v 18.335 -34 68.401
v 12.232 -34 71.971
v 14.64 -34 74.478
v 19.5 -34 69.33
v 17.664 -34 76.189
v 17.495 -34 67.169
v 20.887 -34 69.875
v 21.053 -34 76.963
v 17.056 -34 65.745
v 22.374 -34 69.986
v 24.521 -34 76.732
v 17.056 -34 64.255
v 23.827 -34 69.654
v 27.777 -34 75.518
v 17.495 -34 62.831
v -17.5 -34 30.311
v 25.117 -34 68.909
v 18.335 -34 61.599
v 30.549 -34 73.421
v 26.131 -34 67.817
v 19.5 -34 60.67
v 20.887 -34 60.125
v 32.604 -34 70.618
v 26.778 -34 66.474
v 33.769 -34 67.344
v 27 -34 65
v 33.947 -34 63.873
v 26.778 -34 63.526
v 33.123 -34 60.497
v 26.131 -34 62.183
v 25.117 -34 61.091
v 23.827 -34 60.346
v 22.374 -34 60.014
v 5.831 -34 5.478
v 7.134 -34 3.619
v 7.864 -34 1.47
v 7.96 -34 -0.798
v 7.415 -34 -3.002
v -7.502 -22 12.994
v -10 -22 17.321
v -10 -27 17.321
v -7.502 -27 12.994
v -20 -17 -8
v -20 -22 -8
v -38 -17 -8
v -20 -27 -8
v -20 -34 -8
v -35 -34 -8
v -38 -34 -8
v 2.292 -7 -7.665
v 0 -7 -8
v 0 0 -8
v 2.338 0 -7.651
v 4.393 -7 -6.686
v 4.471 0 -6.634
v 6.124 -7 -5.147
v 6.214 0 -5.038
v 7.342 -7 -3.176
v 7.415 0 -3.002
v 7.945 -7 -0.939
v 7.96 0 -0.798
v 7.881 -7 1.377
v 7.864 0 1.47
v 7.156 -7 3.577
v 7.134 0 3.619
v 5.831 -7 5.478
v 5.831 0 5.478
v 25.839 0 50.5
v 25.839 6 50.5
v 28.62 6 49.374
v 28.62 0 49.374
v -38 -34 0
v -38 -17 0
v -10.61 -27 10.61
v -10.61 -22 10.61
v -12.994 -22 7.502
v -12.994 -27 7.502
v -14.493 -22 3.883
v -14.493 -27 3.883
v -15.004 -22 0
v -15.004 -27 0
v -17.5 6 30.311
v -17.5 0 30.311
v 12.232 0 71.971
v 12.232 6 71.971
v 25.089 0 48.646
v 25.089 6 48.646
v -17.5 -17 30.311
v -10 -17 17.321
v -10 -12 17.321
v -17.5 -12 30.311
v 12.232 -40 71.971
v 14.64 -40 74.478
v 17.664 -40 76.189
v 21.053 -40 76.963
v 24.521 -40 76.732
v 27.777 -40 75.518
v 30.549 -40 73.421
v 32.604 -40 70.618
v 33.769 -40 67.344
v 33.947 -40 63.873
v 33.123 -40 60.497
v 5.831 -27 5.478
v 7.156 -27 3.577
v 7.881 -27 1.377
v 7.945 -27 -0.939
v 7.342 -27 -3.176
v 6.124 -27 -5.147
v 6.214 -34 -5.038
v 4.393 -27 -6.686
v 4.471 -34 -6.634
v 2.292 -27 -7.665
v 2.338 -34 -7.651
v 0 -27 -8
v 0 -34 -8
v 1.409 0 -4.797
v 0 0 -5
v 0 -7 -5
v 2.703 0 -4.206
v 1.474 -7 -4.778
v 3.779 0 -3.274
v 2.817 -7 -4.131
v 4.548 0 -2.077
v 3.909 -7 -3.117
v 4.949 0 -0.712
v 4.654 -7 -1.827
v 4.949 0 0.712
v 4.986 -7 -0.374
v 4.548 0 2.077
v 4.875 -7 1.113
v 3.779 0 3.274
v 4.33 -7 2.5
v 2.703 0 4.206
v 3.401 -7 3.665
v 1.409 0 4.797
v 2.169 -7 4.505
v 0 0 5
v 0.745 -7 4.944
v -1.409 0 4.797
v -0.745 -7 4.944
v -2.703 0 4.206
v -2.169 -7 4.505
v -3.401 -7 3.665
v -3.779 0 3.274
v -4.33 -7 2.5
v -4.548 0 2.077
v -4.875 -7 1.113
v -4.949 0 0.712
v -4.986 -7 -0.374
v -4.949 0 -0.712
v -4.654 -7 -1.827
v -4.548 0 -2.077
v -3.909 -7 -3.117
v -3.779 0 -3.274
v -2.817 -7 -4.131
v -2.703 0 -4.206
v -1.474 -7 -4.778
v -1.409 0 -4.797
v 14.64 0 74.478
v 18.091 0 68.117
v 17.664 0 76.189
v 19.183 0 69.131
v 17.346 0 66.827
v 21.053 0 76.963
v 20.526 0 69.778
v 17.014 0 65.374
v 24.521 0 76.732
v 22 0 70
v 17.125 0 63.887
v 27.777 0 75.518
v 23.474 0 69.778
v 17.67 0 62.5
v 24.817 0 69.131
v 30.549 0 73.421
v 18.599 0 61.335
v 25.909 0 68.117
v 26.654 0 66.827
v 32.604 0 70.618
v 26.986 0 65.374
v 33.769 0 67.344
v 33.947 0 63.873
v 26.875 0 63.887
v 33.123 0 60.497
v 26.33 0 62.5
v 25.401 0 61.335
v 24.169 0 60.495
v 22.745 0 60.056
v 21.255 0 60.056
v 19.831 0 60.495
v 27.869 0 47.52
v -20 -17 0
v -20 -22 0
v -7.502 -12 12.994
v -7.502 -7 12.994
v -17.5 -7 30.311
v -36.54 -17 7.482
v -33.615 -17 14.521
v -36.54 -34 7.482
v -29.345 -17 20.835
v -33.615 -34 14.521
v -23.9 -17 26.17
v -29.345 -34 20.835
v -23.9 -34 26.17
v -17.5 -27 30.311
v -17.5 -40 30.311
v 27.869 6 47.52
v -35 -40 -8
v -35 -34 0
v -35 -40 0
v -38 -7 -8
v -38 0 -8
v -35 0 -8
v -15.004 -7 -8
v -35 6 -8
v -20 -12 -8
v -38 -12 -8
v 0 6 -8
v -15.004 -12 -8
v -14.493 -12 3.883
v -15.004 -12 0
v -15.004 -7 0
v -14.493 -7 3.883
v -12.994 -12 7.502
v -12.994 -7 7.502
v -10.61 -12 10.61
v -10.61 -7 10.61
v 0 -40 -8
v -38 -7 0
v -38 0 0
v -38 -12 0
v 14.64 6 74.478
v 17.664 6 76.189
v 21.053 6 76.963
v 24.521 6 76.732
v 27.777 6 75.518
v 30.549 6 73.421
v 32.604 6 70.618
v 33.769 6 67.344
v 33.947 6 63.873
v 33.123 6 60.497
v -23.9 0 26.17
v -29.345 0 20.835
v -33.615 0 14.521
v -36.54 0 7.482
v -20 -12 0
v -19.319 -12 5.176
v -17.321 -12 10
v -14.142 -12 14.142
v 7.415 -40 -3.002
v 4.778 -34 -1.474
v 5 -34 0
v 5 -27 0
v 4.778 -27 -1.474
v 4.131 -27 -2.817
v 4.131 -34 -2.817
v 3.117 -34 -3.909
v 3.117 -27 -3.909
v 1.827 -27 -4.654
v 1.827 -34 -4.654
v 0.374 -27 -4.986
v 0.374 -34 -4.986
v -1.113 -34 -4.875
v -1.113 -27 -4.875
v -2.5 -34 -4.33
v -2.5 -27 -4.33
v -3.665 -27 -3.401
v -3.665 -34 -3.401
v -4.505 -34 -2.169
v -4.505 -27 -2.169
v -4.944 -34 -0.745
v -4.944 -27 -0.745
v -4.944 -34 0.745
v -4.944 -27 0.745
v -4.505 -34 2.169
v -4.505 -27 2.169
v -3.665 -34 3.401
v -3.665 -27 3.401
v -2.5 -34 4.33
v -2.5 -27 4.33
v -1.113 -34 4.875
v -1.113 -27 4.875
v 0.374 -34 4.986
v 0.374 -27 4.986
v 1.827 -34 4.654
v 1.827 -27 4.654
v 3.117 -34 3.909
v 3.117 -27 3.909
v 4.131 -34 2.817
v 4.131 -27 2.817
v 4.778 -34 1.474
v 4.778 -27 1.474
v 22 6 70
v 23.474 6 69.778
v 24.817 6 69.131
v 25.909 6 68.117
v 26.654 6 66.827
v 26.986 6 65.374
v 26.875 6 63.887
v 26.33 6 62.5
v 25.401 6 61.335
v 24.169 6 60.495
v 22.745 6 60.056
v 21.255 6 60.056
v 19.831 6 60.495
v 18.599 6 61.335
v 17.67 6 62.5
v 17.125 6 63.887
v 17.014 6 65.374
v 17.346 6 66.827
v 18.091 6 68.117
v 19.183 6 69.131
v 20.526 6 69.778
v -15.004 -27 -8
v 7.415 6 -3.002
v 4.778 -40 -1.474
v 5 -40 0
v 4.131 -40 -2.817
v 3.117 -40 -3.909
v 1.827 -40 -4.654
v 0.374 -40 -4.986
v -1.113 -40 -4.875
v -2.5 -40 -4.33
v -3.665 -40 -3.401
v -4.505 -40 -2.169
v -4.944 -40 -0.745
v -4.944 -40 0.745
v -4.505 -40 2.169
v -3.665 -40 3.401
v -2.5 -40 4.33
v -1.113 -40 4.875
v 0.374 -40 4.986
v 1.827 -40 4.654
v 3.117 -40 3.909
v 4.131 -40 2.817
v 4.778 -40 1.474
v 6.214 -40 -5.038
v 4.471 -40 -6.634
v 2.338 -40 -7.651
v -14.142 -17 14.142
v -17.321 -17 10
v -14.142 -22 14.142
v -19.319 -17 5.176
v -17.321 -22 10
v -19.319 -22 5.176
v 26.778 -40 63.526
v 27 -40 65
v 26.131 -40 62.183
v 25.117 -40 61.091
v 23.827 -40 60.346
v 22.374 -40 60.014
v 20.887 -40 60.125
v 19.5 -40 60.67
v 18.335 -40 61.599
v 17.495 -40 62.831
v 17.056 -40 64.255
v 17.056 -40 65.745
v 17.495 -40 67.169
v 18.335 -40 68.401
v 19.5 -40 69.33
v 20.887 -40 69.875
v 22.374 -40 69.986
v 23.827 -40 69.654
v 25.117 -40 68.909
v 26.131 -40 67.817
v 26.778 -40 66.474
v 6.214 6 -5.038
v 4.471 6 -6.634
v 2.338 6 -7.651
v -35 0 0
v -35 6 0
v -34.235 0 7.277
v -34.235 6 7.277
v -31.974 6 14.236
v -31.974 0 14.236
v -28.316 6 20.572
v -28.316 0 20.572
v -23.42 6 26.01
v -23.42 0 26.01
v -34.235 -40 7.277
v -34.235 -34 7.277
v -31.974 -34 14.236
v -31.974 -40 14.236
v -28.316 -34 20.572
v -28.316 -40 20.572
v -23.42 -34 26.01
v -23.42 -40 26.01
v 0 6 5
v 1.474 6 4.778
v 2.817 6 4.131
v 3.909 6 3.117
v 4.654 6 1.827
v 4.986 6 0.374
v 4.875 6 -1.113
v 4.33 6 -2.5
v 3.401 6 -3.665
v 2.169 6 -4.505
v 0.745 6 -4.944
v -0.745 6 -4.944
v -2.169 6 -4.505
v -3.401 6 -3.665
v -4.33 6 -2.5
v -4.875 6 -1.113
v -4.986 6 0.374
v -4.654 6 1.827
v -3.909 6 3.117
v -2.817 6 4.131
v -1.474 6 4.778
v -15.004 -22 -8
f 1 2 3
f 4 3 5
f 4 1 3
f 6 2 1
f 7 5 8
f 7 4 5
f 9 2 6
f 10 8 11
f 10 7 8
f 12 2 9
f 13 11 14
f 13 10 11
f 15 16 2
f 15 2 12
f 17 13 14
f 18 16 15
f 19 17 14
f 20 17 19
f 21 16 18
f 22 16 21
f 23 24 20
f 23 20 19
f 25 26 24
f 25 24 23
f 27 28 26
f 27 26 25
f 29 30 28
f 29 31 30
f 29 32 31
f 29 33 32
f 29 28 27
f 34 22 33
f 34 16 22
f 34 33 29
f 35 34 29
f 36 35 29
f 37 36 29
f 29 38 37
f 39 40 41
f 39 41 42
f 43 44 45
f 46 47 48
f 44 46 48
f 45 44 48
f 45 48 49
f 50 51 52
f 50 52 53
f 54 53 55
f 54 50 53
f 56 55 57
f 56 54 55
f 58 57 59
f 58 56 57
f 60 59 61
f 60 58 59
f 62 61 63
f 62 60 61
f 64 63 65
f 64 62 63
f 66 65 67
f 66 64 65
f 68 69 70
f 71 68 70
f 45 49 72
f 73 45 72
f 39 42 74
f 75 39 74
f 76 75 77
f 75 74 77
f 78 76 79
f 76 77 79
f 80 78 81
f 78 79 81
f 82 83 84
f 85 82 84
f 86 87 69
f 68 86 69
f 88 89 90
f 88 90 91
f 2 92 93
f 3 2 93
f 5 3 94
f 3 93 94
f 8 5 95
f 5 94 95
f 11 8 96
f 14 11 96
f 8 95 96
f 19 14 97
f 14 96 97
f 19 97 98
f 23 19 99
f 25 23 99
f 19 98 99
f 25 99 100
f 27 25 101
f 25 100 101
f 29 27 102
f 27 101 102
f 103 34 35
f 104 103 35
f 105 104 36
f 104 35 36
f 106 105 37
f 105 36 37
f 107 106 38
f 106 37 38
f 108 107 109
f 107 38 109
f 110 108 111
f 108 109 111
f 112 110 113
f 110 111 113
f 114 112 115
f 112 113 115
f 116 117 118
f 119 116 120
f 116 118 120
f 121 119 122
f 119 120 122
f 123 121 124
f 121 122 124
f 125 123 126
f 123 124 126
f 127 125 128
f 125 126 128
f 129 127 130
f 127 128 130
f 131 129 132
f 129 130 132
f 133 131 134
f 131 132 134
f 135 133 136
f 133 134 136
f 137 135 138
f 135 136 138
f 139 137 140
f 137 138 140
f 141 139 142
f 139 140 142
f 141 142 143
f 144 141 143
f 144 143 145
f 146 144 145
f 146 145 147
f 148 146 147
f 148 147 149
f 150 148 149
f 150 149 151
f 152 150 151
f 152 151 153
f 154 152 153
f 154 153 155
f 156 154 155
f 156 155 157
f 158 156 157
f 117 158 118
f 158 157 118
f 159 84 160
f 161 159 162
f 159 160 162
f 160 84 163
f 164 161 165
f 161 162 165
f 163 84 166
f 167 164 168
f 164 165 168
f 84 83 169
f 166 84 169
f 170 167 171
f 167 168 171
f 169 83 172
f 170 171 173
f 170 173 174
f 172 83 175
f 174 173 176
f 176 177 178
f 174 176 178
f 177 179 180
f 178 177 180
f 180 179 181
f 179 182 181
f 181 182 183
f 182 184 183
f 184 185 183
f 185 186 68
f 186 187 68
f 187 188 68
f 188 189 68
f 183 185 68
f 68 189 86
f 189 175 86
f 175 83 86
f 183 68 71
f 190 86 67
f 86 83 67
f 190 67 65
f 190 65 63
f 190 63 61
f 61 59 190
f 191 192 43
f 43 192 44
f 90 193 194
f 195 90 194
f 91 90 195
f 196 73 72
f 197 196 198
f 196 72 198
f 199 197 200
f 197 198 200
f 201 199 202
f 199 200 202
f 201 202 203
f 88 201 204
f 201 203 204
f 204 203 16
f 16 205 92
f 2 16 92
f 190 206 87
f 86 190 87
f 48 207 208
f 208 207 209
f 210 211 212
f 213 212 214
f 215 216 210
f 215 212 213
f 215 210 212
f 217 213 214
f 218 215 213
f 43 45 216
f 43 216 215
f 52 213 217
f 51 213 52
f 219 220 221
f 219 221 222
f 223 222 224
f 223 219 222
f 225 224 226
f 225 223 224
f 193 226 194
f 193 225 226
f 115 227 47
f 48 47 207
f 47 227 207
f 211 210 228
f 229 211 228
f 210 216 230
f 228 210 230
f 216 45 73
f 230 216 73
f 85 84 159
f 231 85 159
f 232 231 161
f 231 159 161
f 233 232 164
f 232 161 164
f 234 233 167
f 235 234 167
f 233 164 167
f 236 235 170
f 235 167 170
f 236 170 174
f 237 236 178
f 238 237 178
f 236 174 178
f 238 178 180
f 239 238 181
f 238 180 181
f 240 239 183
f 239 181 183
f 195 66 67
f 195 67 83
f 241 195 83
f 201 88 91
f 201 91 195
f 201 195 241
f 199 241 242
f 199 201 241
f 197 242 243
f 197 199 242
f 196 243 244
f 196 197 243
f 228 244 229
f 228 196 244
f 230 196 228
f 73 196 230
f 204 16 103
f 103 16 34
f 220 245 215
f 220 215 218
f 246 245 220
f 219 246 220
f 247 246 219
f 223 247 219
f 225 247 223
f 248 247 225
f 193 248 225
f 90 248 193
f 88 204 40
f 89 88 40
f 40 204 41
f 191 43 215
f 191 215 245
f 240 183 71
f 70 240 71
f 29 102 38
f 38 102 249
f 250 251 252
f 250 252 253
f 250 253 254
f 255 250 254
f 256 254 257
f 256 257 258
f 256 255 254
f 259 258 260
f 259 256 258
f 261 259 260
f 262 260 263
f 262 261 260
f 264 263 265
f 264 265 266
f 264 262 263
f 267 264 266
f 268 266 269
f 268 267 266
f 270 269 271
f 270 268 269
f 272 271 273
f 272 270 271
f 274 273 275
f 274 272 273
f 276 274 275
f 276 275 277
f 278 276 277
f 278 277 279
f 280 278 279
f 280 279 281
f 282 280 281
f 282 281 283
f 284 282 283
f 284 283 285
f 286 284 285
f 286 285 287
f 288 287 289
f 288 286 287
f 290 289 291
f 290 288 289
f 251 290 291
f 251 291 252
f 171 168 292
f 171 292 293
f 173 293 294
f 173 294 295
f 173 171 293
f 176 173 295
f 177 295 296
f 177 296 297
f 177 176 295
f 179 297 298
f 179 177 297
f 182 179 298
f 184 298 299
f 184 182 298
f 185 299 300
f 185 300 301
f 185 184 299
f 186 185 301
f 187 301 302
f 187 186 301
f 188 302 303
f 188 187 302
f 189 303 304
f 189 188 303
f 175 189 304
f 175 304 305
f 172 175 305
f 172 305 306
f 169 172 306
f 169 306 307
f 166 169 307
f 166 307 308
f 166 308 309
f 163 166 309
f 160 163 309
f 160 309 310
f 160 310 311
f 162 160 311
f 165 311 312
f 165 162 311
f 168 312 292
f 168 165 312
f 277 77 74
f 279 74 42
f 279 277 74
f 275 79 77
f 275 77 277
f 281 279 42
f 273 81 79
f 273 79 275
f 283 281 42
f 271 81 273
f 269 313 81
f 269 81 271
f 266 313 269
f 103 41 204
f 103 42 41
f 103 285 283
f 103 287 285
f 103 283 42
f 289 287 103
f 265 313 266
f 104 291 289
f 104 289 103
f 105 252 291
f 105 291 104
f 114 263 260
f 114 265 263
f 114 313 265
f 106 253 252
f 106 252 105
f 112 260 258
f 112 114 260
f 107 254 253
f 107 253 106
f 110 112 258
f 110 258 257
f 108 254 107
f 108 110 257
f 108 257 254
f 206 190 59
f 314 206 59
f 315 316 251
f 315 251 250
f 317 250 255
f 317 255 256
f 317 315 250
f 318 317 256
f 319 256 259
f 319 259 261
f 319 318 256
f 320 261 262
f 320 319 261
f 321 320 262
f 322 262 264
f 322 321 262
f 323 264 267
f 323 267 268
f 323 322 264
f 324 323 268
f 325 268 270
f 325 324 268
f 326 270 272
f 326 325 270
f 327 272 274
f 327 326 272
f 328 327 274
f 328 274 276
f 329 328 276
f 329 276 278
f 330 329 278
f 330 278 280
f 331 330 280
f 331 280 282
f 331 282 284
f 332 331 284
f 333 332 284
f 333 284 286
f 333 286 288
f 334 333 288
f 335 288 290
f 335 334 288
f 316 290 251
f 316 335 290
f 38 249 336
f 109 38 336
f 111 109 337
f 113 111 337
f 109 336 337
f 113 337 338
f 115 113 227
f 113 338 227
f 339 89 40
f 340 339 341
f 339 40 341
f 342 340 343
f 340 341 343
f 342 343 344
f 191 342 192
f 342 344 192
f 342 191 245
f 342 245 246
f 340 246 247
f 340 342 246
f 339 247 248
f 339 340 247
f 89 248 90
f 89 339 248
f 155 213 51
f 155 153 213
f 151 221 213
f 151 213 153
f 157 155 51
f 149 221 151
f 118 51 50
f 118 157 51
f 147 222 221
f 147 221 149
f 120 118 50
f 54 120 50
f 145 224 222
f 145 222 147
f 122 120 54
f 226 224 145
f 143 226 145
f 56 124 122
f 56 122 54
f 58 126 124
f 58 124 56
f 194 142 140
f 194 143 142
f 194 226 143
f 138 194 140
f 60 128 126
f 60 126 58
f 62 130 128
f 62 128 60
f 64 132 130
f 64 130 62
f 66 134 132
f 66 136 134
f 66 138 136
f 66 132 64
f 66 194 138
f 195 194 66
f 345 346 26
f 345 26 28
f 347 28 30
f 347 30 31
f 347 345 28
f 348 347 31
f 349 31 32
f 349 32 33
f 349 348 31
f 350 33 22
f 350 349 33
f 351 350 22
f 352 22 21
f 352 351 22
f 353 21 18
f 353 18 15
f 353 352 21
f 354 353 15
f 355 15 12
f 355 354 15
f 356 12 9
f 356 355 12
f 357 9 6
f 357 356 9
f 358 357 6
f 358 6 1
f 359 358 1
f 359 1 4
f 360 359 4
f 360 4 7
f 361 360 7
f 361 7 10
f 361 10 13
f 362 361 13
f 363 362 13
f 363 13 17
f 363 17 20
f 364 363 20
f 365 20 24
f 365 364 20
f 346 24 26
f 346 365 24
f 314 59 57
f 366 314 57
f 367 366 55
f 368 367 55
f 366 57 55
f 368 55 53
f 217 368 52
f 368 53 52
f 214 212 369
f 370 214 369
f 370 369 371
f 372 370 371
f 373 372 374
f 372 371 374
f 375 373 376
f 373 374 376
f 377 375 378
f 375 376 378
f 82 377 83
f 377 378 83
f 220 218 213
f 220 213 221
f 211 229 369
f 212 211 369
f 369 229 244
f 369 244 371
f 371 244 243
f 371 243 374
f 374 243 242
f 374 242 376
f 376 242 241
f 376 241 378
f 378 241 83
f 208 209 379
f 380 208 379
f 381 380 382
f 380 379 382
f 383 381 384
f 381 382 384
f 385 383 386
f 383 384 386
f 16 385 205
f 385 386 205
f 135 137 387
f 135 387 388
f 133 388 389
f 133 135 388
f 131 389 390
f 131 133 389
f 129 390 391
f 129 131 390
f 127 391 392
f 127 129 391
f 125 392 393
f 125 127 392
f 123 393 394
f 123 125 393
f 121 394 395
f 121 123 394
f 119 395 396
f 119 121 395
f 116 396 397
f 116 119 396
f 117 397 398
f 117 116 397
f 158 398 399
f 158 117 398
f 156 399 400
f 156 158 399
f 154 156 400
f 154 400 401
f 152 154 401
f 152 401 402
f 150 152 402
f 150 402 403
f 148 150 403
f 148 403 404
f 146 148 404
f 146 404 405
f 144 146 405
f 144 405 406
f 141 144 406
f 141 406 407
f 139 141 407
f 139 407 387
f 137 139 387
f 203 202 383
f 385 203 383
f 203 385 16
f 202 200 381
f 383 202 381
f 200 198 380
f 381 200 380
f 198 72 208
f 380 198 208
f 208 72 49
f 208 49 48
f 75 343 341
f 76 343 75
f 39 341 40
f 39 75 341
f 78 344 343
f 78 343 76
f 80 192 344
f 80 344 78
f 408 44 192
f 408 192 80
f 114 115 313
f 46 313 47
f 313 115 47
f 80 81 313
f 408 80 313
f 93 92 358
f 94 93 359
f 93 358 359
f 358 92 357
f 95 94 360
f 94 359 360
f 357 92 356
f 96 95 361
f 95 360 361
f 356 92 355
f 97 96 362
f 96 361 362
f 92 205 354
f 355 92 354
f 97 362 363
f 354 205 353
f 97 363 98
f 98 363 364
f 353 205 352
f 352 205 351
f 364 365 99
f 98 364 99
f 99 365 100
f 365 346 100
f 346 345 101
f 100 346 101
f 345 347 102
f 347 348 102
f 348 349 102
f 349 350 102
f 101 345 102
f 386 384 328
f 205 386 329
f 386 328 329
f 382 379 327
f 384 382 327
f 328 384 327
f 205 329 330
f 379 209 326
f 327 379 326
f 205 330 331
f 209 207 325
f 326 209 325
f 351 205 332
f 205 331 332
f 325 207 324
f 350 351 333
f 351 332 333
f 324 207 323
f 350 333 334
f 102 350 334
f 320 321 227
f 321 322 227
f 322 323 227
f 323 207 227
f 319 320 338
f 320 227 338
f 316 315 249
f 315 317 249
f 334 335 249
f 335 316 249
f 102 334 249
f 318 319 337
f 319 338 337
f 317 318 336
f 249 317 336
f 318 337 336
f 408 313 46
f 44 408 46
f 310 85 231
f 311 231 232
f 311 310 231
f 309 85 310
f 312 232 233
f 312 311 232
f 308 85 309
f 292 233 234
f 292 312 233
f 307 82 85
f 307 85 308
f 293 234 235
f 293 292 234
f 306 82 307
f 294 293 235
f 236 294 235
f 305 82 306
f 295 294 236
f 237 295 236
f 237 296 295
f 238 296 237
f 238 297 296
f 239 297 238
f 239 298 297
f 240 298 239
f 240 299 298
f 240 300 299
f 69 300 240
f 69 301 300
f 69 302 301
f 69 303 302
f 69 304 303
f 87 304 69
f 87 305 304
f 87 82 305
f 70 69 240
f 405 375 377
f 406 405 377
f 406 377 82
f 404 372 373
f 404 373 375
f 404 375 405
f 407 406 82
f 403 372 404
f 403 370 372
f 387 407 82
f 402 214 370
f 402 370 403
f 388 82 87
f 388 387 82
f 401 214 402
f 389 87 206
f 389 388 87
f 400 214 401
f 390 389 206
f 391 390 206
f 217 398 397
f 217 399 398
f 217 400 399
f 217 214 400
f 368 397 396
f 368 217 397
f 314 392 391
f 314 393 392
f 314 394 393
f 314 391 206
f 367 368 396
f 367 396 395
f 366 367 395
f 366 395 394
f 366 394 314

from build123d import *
from build123d.topology import SkipClean

# Parameters (mm, degrees)
SKETCH2_R           = 5
BOSS_EXTRUDE1_DEPTH = 6
BOSS_EXTRUDE2_START = 7
SKETCH3_R           = 5
BOSS_EXTRUDE2_DEPTH = 7
BOSS_EXTRUDE3_START = 5
SKETCH4_W           = 22.995704609
SKETCH4_H           = 8
BOSS_EXTRUDE3_DEPTH = 5
BOSS_EXTRUDE4_START = 5
SKETCH5_W           = 18
SKETCH5_H           = 8
BOSS_EXTRUDE4_DEPTH = 5
MIRROR1_START       = -40
MIRROR1_OUTLINE_R   = 5
MIRROR1_DEPTH       = 6
MIRROR1_START_2     = -34
MIRROR1_2_DEPTH     = 17
MIRROR1_3_OUTLINE_R = 5
MIRROR1_3_DEPTH     = 7
MIRROR1_START_3     = -27
MIRROR1_4_DEPTH     = 5
CUT_EXTRUDE1_DEPTH  = 14


# Read off the part's stored shape, not the designer's step: Mirror1
with BuildPart() as part:
    # Sketch2 → Boss-Extrude1 (new body)
    with BuildSketch(Plane(origin=(0, 0, 0), x_dir=(1, 0, 0), z_dir=(0, 1, 0))):
        with BuildLine():
            ThreePointArc((7.415342239, 3.002115835), (4.471189625, 6.633887498), (0, 8))
            Line((0, 8), (-35, 8))
            Line((-35, 8), (-35, 0))
            ThreePointArc((-35, 0), (-30.310889132, -17.5), (-17.5, -30.310889132))
            Line((-17.5, -30.310889132), (12.232451358, -71.97101094))
            ThreePointArc((12.232451358, -71.97101094), (27.776984485, -75.517910927), (33.123013358, -60.496826248))
            Line((33.123013358, -60.496826248), (7.415342239, 3.002115835))
        make_face()
        with Locations(Location((0, 0, 0), (0, 0, 270))):
            Circle(SKETCH2_R, mode=Mode.SUBTRACT)
        with Locations(Location((22, -65, 0), (0, 0, 270))):
            Circle(SKETCH2_R, mode=Mode.SUBTRACT)
    extrude(amount=BOSS_EXTRUDE1_DEPTH)

    # Sketch3 → Boss-Extrude2 (add)
    with SkipClean():  # the faces are left unmerged after this step: merging them gives an invalid solid
        with BuildSketch(Plane.XZ.offset(BOSS_EXTRUDE2_START)):
            with BuildLine():
                Line((5.830508196, 5.47769789), (-17.5, 30.310889132))
                ThreePointArc((-17.5, 30.310889132), (-31.638718646, 17.785480653), (-38, 0))
                Line((-38, 0), (-38, -8))
                Line((-38, -8), (-35, -8))
                Line((-35, -8), (0, -8))
                ThreePointArc((0, -8), (7.342396854, -3.176351435), (5.830508196, 5.47769789))
            make_face()
            with Locations(Location((0, 0, 0), (0, 0, 270))):
                Circle(SKETCH3_R, mode=Mode.SUBTRACT)
        extrude(amount=-BOSS_EXTRUDE2_DEPTH)

    # Sketch4 → Boss-Extrude3 (add)
    with SkipClean():  # the faces are left unmerged after this step: merging them gives an invalid solid
        with BuildSketch(Plane.XZ.offset(7).offset(BOSS_EXTRUDE3_START)):
            with BuildLine():
                Line((-38, 0), (-15.004295391, 0))
                ThreePointArc((-15.004295391, 0), (-12.994100974, 7.502147695), (-7.502147695, 12.994100974))
                Line((-7.502147695, 12.994100974), (-17.5, 30.310889132))
                ThreePointArc((-17.5, 30.310889132), (-31.638718646, 17.785480653), (-38, 0))
            make_face()
            with Locations((-26.502147695, -4)):
                Rectangle(SKETCH4_W, SKETCH4_H)
        extrude(amount=-BOSS_EXTRUDE3_DEPTH)

    # Sketch5 → Boss-Extrude4 (add)
    with SkipClean():  # the faces are left unmerged after this step: merging them gives an invalid solid
        with BuildSketch(Plane.XZ.offset(12).offset(BOSS_EXTRUDE4_START)):
            with Locations((-29, -4)):
                Rectangle(SKETCH5_W, SKETCH5_H)
            with BuildLine():
                ThreePointArc((-20, 0), (-17.320508076, 10), (-10, 17.320508076))
                Line((-10, 17.320508076), (-17.5, 30.310889132))
                ThreePointArc((-17.5, 30.310889132), (-31.638718646, 17.785480653), (-38, 0))
                Line((-38, 0), (-20, 0))
            make_face()
        extrude(amount=-BOSS_EXTRUDE4_DEPTH)



with BuildPart() as body_2:
    # Mirror1 outline → Mirror1 (new body)
    with BuildSketch(Plane(origin=(0, 0, 0), x_dir=(1, 0, 0), z_dir=(0, 1, 0)).offset(MIRROR1_START)):
        with BuildLine():
            Line((0, 8), (-35, 8))
            Line((-35, 8), (-35, 0))
            ThreePointArc((-35, 0), (-30.310889132, -17.5), (-17.5, -30.310889132))
            Line((-17.5, -30.310889132), (12.232451358, -71.97101094))
            ThreePointArc((12.232451358, -71.97101094), (27.776984485, -75.517910927), (33.123013358, -60.496826248))
            Line((33.123013358, -60.496826248), (7.415342239, 3.002115835))
            ThreePointArc((7.415342239, 3.002115835), (4.471189625, 6.633887498), (0, 8))
        make_face()
        Circle(MIRROR1_OUTLINE_R, mode=Mode.SUBTRACT)
        with Locations((22, -65)):
            Circle(MIRROR1_OUTLINE_R, mode=Mode.SUBTRACT)
    extrude(amount=MIRROR1_DEPTH)


with BuildPart() as part_1:
    with SkipClean():  # the faces are left unmerged after this step: merging them gives an invalid solid
        add(part.part)

        add(body_2.part)  # Mirror1 2 merges body 2
        # Mirror1 2 outline → Mirror1 2 (add)
        with BuildSketch(Plane(origin=(0, 0, 0), x_dir=(1, 0, 0), z_dir=(0, 1, 0)).offset(MIRROR1_START_2)):
            with BuildLine():
                ThreePointArc((-38, 0), (-31.638718646, -17.785480653), (-17.5, -30.310889132))
                Line((-17.5, -30.310889132), (-10, -17.320508076))
                ThreePointArc((-10, -17.320508076), (-17.320508076, -10), (-20, 0))
                Line((-20, 0), (-20, 8))
                Line((-20, 8), (-38, 8))
                Line((-38, 8), (-38, 0))
            make_face()
        extrude(amount=MIRROR1_2_DEPTH)

    # Mirror1 3 outline → Mirror1 3 (add)
    with SkipClean():  # the faces are left unmerged after this step: merging them gives an invalid solid
        with BuildSketch(Plane(origin=(0, 0, 0), x_dir=(1, 0, 0), z_dir=(0, 1, 0)).offset(MIRROR1_START_2)):
            with BuildLine():
                Line((-17.5, -30.310889132), (5.830508196, -5.47769789))
                ThreePointArc((5.830508196, -5.47769789), (7.342396854, 3.176351435), (0, 8))
                Line((0, 8), (-20, 8))
                Line((-20, 8), (-20, 0))
                ThreePointArc((-20, 0), (-17.320508076, -10), (-10, -17.320508076))
                Line((-10, -17.320508076), (-17.5, -30.310889132))
            make_face()
            Circle(MIRROR1_3_OUTLINE_R, mode=Mode.SUBTRACT)
        extrude(amount=MIRROR1_3_DEPTH)

    # Mirror1 4 outline → Mirror1 4 (add)
    with SkipClean():  # the faces are left unmerged after this step: merging them gives an invalid solid
        with BuildSketch(Plane(origin=(0, 0, 0), x_dir=(1, 0, 0), z_dir=(0, 1, 0)).offset(MIRROR1_START_3)):
            with BuildLine():
                ThreePointArc((-20, 0), (-17.320508076, -10), (-10, -17.320508076))
                Line((-10, -17.320508076), (-7.502147695, -12.994100974))
                ThreePointArc((-7.502147695, -12.994100974), (-12.994100974, -7.502147695), (-15.004295391, 0))
                Line((-15.004295391, 0), (-15.004295391, 8))
                Line((-15.004295391, 8), (-20, 8))
                Line((-20, 8), (-20, 0))
            make_face()
        extrude(amount=MIRROR1_4_DEPTH)

    # Sketch6 → Cut-Extrude1 (cut)
    with SkipClean():  # the faces are left unmerged after this step: merging them gives an invalid solid
        with BuildSketch(Plane(origin=(0, 6, 0), x_dir=(1, 0, 0), z_dir=(0, 1, 0))):
            Polygon((25.839086267, -50.499606328), (28.619839606, -49.37381289), (27.869310647, -47.519977331), (25.088557308, -48.645770769), align=None)
        extrude(amount=-CUT_EXTRUDE1_DEPTH, mode=Mode.SUBTRACT)


solid = part_1.part
